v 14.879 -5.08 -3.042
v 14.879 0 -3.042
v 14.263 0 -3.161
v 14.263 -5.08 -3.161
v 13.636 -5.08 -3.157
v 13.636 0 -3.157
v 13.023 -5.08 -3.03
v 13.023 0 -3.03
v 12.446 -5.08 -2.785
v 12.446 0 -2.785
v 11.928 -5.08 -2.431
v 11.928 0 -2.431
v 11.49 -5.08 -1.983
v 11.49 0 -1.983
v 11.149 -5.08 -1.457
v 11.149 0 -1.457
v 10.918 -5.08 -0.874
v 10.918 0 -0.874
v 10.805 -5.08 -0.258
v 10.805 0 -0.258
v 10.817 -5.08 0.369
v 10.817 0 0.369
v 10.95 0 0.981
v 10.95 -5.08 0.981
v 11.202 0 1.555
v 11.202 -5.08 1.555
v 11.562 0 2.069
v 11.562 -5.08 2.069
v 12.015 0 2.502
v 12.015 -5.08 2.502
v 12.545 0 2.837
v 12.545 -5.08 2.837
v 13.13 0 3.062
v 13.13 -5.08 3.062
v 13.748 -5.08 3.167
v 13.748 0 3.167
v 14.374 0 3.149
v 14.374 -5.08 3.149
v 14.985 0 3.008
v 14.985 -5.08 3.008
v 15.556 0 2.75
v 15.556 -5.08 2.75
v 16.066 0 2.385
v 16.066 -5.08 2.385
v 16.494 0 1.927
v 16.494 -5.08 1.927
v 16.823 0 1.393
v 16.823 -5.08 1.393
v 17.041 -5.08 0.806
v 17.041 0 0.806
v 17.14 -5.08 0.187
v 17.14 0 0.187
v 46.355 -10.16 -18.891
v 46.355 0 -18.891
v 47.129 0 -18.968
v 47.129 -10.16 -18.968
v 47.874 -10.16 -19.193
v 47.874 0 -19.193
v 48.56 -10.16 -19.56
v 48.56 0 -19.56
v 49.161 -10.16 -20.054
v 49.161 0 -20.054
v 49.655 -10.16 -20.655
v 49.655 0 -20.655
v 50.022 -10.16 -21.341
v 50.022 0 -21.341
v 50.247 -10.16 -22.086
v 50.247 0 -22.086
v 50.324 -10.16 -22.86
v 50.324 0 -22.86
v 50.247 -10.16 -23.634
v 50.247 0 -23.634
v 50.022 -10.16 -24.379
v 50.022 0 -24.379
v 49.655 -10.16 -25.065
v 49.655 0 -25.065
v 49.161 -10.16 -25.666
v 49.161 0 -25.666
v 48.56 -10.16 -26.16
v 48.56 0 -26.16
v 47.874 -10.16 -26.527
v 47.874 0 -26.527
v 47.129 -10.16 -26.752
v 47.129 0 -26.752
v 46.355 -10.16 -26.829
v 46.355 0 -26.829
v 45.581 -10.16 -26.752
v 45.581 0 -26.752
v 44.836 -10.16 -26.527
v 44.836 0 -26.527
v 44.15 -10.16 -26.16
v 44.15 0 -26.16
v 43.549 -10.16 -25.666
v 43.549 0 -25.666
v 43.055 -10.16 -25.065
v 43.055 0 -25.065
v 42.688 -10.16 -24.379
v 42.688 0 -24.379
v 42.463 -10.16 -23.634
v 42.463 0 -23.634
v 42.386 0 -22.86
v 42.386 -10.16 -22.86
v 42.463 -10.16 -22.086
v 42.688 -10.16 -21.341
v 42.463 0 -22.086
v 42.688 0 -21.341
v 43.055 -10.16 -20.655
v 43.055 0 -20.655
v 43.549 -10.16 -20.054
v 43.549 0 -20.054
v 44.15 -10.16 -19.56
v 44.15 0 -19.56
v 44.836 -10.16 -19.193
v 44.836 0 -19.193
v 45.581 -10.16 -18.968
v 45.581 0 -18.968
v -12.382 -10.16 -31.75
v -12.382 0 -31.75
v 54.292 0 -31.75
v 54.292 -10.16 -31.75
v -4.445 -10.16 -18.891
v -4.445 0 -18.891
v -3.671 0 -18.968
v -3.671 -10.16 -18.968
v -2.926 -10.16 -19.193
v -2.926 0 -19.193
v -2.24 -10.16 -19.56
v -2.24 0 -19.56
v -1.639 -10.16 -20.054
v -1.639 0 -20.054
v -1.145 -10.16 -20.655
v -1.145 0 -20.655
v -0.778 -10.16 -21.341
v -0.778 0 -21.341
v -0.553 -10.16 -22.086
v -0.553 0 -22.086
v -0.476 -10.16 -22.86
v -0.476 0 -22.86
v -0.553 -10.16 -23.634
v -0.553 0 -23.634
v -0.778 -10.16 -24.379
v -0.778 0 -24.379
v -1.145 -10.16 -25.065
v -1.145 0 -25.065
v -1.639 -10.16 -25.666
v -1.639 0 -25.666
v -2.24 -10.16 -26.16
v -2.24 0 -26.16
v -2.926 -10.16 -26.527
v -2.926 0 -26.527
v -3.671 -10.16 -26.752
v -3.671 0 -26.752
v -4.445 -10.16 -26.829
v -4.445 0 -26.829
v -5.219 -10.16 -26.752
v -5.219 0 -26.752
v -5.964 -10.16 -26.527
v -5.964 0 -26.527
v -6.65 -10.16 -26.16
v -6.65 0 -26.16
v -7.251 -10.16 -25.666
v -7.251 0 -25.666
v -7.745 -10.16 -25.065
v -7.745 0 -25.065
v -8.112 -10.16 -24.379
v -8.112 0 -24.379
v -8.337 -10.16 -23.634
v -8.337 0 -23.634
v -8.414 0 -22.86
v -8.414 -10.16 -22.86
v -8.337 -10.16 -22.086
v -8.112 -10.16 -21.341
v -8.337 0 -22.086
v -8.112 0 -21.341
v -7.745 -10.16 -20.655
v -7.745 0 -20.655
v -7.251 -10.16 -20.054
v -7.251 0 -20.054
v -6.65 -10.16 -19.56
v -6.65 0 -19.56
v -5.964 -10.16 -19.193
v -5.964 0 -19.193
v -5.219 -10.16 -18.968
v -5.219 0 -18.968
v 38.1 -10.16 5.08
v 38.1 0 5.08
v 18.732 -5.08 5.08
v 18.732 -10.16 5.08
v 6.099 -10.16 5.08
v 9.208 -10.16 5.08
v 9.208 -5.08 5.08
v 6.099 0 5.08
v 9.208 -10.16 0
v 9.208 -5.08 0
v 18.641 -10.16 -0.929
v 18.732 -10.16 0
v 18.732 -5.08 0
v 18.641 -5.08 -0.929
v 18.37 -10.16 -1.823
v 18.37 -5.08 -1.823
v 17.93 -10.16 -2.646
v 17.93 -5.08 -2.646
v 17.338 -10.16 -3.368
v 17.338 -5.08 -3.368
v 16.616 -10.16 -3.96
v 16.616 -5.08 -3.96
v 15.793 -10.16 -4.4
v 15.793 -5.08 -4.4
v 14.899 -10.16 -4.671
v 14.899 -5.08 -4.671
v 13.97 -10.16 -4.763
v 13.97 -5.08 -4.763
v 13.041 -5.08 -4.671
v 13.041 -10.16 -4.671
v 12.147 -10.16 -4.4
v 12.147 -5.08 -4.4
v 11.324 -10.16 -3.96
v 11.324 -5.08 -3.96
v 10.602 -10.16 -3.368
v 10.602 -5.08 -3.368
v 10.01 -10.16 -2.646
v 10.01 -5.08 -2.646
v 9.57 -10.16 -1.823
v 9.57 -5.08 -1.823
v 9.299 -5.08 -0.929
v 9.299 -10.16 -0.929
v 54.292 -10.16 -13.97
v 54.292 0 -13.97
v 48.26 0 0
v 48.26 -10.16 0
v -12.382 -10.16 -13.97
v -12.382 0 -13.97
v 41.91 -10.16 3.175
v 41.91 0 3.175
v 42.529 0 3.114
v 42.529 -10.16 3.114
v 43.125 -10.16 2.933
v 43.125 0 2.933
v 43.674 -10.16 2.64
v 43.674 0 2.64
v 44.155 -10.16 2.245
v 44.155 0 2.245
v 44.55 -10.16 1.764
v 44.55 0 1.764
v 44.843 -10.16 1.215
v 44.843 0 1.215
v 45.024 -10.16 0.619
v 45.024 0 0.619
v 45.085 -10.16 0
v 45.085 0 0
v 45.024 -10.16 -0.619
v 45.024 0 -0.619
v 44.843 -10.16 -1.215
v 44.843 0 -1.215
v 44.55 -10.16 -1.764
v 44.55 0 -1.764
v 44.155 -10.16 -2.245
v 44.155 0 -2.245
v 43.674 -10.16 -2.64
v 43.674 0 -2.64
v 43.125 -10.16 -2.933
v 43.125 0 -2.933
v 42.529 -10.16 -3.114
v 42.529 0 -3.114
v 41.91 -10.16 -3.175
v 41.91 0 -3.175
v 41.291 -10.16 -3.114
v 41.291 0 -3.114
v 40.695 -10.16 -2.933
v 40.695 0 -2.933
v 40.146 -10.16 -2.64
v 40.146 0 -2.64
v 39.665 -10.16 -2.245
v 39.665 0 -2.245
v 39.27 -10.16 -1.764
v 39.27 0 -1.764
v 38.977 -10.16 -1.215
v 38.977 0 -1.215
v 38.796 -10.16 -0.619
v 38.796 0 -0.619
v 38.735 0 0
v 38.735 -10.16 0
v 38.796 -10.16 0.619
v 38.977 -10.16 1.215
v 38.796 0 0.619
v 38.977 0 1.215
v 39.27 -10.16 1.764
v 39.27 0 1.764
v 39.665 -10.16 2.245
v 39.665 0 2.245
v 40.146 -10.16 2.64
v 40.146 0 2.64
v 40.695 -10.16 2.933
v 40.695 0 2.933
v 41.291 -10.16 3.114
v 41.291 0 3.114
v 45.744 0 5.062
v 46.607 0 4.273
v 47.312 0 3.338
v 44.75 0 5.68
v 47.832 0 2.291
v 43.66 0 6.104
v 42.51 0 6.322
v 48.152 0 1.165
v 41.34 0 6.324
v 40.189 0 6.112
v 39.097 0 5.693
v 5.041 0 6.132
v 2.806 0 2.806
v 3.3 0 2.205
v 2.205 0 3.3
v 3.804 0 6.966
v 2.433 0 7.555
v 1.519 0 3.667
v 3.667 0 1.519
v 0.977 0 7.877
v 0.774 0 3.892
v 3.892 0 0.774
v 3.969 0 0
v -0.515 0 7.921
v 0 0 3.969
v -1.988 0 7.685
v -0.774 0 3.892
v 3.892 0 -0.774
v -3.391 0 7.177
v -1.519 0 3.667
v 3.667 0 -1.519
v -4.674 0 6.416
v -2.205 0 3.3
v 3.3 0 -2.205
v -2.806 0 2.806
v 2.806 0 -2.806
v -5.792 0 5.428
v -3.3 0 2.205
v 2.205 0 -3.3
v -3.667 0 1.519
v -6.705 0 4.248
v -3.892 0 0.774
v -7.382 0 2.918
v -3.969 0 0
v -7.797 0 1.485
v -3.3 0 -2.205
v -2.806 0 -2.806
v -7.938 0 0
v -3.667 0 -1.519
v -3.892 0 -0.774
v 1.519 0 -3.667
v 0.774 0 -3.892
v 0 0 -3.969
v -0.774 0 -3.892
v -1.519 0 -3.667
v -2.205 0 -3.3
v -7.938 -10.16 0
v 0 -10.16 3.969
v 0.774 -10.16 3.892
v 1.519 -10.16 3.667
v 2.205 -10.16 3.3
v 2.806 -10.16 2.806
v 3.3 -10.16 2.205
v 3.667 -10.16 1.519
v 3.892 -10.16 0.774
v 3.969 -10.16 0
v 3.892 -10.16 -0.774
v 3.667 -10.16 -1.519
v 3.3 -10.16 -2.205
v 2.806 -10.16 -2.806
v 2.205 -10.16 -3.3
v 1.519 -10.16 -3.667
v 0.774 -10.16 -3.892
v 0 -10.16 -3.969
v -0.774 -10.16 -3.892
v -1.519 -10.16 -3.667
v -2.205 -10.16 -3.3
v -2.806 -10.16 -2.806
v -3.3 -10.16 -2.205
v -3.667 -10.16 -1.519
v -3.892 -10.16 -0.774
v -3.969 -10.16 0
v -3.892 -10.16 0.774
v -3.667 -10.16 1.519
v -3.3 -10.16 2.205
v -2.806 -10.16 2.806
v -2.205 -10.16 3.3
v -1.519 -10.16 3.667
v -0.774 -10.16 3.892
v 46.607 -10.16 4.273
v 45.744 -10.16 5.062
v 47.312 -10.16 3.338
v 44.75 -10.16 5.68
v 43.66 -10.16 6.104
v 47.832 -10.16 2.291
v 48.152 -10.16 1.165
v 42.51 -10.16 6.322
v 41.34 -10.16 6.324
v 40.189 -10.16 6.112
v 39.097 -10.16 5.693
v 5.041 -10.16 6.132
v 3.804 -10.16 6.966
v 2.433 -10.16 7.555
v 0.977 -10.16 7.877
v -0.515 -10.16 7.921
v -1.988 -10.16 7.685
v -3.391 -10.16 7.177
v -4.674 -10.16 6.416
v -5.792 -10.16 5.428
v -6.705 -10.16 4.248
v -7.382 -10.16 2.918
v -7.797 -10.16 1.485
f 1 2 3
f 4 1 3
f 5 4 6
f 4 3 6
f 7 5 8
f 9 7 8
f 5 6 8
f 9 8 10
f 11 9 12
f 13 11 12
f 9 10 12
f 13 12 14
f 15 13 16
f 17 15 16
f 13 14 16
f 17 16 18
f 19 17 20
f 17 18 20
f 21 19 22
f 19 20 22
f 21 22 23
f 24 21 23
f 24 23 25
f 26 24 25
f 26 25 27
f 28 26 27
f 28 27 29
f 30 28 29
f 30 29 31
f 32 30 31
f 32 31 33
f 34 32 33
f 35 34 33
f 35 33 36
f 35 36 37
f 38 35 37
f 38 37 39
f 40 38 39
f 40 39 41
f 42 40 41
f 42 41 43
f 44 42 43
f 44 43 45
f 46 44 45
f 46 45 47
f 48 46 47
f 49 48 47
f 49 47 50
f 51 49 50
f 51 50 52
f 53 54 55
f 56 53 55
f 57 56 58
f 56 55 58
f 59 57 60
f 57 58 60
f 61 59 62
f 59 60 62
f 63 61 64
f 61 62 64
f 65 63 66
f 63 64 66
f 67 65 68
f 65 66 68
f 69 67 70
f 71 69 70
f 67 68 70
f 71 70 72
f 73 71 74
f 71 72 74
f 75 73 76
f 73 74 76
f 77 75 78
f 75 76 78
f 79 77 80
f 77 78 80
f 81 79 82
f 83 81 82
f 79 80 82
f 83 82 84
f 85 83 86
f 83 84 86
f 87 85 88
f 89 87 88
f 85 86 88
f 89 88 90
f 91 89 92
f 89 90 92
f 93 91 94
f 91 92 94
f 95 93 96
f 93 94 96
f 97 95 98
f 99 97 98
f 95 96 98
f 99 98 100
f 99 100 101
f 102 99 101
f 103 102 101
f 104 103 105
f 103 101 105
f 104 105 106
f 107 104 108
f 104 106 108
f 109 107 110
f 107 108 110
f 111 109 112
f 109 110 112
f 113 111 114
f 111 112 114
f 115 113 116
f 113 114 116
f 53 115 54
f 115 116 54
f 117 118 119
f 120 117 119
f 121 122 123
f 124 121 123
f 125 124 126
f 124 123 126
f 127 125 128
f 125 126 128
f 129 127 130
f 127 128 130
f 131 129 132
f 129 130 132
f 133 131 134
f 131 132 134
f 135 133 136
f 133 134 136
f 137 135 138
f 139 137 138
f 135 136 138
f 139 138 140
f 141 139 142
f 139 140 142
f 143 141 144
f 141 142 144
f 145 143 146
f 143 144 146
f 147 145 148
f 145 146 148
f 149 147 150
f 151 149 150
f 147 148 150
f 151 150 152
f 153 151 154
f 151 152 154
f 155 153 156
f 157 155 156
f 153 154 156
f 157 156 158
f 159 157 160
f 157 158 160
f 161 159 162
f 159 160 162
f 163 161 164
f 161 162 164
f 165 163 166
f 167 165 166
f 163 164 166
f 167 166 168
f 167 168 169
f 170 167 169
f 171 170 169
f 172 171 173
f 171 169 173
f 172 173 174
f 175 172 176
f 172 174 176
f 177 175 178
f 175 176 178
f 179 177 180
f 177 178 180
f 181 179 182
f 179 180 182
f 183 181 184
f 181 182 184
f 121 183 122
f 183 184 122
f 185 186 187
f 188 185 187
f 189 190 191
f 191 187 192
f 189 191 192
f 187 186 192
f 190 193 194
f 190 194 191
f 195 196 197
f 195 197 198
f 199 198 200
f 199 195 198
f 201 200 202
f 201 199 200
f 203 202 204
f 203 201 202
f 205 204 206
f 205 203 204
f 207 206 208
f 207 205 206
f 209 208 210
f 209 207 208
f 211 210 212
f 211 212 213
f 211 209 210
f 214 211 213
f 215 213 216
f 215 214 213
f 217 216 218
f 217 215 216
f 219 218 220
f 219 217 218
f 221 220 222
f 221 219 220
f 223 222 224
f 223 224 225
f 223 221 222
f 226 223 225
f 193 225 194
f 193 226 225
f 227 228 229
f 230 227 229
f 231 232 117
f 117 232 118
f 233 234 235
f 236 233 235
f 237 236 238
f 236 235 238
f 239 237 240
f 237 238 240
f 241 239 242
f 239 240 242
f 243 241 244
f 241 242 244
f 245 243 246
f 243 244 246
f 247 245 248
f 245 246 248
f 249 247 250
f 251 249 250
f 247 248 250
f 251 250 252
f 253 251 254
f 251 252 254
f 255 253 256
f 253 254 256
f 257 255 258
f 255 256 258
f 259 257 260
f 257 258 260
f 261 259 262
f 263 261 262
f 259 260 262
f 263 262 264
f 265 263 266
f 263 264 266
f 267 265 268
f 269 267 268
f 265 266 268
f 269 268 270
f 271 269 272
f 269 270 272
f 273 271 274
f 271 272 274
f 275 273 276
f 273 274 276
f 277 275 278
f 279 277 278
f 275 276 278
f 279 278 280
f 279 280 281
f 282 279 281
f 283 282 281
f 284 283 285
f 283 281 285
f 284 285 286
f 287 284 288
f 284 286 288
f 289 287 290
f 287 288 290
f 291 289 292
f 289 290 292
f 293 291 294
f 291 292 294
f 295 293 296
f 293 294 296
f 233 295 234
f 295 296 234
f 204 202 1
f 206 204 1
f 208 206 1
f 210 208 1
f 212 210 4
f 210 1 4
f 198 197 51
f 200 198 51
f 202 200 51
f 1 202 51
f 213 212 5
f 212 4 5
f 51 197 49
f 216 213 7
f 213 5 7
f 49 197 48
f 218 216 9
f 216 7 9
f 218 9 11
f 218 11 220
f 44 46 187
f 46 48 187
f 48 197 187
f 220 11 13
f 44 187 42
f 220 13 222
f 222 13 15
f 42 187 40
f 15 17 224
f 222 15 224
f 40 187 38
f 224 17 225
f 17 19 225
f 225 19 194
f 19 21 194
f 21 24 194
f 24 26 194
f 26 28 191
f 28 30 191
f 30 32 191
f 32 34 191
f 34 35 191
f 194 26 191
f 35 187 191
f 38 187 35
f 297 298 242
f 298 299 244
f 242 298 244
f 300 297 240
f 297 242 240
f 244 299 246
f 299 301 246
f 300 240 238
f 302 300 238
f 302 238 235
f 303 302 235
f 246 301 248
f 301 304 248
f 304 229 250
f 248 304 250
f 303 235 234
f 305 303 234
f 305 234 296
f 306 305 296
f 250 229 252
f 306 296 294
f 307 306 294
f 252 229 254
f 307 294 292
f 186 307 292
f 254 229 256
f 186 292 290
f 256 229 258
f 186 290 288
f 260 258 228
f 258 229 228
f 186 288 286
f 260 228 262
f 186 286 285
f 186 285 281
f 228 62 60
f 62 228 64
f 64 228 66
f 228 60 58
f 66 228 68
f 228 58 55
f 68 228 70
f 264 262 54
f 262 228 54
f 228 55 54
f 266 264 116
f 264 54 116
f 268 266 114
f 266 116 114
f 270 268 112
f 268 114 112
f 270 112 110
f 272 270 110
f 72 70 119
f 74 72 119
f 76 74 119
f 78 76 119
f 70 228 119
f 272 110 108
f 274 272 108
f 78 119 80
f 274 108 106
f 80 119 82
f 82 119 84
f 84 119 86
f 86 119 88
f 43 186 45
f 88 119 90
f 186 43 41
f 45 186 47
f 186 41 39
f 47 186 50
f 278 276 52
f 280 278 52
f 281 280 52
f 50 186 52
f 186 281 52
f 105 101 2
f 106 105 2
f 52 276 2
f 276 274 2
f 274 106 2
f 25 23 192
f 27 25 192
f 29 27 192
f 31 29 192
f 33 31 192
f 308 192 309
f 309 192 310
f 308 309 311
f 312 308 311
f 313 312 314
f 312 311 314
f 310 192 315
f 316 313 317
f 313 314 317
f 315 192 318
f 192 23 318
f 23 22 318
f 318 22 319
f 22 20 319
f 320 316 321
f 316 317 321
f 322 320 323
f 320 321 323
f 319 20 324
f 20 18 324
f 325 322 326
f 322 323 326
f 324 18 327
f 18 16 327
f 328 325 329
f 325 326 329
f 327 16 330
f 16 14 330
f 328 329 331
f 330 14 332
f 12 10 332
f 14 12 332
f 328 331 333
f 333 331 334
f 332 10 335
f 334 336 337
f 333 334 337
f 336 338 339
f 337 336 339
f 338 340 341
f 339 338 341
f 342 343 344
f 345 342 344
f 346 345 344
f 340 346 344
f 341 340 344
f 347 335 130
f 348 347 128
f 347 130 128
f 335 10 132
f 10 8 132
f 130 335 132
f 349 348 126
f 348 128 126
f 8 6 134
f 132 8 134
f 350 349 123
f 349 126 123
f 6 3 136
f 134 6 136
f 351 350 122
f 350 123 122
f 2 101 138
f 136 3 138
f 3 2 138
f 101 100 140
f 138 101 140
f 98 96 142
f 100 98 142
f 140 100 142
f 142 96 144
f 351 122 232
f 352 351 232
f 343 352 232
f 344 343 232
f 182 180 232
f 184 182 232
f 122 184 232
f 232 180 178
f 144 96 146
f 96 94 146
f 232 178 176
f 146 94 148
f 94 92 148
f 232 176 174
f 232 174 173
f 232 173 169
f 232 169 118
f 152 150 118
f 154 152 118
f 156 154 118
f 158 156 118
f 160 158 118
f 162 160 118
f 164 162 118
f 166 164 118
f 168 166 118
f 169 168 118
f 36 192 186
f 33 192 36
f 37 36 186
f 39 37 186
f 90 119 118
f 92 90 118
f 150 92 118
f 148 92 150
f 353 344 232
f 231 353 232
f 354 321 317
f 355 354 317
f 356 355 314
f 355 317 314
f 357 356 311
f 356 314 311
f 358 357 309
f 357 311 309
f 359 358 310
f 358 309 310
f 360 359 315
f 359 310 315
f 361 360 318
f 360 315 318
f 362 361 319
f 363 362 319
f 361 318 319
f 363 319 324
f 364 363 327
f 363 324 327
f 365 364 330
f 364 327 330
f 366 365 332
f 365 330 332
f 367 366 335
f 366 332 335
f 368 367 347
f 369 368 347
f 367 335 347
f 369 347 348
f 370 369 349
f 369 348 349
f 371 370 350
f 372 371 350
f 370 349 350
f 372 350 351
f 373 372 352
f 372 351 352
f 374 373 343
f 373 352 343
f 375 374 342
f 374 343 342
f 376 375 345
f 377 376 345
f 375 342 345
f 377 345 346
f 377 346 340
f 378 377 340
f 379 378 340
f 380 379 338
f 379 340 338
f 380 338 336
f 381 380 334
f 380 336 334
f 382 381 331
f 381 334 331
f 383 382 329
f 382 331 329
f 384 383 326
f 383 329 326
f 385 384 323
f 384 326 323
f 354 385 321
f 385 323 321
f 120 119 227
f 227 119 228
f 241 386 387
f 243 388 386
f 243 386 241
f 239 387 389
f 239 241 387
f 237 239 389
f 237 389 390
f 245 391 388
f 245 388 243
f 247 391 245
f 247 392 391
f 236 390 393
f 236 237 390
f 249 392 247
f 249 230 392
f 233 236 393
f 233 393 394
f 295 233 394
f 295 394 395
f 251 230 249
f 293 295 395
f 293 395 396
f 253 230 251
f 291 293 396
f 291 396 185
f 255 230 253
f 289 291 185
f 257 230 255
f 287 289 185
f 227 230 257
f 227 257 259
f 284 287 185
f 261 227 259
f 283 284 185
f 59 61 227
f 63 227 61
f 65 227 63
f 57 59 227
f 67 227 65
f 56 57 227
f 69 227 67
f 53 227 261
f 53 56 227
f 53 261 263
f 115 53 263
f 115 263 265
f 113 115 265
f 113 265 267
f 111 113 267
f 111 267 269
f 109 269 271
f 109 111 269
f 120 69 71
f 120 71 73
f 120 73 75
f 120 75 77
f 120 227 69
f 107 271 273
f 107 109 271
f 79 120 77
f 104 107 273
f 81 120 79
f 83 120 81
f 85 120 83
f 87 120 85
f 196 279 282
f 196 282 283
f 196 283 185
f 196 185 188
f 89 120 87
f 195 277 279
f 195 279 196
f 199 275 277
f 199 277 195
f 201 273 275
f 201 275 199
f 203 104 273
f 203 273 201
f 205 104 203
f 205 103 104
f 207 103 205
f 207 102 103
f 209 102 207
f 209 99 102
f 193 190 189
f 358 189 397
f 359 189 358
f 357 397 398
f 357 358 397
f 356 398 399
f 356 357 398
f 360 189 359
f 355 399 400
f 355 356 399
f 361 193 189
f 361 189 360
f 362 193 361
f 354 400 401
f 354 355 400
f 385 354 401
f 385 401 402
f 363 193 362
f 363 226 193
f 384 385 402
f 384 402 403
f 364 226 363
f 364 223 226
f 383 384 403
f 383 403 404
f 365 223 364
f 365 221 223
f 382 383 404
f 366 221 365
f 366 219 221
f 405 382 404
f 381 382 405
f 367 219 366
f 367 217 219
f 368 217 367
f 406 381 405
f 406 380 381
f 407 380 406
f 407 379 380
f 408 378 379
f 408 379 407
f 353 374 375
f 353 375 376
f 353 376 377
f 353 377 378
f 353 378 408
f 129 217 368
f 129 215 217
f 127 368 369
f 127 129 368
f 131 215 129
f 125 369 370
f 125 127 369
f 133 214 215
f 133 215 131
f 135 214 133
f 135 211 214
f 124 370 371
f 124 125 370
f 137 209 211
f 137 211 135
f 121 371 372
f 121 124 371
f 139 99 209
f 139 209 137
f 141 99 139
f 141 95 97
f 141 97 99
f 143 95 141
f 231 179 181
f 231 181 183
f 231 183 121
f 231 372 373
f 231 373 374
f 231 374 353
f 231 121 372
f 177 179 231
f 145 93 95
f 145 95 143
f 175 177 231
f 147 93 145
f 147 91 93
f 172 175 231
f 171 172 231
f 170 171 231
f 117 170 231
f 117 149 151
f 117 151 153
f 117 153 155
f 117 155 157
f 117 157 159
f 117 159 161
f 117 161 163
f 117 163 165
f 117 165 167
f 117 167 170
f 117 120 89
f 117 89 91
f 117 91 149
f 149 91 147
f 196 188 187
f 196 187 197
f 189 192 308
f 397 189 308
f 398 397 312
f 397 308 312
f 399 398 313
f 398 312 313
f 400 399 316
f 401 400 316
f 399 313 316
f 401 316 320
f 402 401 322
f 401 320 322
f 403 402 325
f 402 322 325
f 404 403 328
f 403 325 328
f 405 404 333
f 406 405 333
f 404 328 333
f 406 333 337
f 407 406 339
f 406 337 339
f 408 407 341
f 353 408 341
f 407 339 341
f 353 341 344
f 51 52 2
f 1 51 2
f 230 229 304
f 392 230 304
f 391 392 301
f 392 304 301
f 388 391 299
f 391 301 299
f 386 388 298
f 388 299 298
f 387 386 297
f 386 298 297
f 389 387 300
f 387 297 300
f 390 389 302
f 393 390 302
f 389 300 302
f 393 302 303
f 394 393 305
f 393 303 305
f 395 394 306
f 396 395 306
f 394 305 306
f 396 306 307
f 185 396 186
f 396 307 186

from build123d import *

# Parameters (mm, degrees)
SKETCH1_R           = 3.96875
SKETCH1_R_2         = 3.175
BOSS_EXTRUDE1_DEPTH = 10.16
CUT_EXTRUDE1_DEPTH  = 5.08


with BuildPart() as part:
    # Sketch1 → Boss-Extrude1 (new body)
    with BuildSketch(Plane(origin=(0, 0, 0), x_dir=(1, 0, 0), z_dir=(0, 1, 0))):
        with BuildLine():
            Line((38.1, -5.08), (6.098975836, -5.08))
            ThreePointArc((6.098975836, -5.08), (-2.701229863, -7.463729863), (-7.9375, 0))
            Line((-7.9375, 0), (-12.3825, 13.97))
            Line((-12.3825, 13.97), (-12.3825, 31.75))
            Line((-12.3825, 31.75), (54.2925, 31.75))
            Line((54.2925, 31.75), (54.2925, 13.97))
            Line((54.2925, 13.97), (48.26, 0))
            ThreePointArc((48.26, 0), (44.749806331, -5.679612663), (38.1, -5.08))
        make_face()
        with Locations(Location((0, 0, 0), (0, 0, 270))):
            Circle(SKETCH1_R, mode=Mode.SUBTRACT)
        with Locations(Location((41.91, 0, 0), (0, 0, 270))):
            Circle(SKETCH1_R_2, mode=Mode.SUBTRACT)
        with Locations(Location((46.355, 22.86, 0), (0, 0, 270))):
            Circle(SKETCH1_R, mode=Mode.SUBTRACT)
        with Locations(Location((-4.445, 22.86, 0), (0, 0, 270))):
            Circle(SKETCH1_R, mode=Mode.SUBTRACT)
        with BuildLine():
            Line((17.139504023, -0.186733089), (14.878562514, 3.04222602))
            ThreePointArc((14.878562514, 3.04222602), (11.369192259, -1.821105185), (17.139504023, -0.186733089))
        make_face(mode=Mode.SUBTRACT)
    extrude(amount=-BOSS_EXTRUDE1_DEPTH)

    # Sketch2 → Cut-Extrude1 (cut)
    with BuildSketch(Plane.XZ.offset(10.16)):
        with BuildLine():
            Line((9.2075, 0), (9.2075, 5.08))
            Line((9.2075, 5.08), (18.7325, 5.08))
            Line((18.7325, 5.08), (18.7325, 0))
            ThreePointArc((18.7325, 0), (13.97, -4.7625), (9.2075, 0))
        make_face()
    extrude(amount=-CUT_EXTRUDE1_DEPTH, mode=Mode.SUBTRACT)


solid = part.part
